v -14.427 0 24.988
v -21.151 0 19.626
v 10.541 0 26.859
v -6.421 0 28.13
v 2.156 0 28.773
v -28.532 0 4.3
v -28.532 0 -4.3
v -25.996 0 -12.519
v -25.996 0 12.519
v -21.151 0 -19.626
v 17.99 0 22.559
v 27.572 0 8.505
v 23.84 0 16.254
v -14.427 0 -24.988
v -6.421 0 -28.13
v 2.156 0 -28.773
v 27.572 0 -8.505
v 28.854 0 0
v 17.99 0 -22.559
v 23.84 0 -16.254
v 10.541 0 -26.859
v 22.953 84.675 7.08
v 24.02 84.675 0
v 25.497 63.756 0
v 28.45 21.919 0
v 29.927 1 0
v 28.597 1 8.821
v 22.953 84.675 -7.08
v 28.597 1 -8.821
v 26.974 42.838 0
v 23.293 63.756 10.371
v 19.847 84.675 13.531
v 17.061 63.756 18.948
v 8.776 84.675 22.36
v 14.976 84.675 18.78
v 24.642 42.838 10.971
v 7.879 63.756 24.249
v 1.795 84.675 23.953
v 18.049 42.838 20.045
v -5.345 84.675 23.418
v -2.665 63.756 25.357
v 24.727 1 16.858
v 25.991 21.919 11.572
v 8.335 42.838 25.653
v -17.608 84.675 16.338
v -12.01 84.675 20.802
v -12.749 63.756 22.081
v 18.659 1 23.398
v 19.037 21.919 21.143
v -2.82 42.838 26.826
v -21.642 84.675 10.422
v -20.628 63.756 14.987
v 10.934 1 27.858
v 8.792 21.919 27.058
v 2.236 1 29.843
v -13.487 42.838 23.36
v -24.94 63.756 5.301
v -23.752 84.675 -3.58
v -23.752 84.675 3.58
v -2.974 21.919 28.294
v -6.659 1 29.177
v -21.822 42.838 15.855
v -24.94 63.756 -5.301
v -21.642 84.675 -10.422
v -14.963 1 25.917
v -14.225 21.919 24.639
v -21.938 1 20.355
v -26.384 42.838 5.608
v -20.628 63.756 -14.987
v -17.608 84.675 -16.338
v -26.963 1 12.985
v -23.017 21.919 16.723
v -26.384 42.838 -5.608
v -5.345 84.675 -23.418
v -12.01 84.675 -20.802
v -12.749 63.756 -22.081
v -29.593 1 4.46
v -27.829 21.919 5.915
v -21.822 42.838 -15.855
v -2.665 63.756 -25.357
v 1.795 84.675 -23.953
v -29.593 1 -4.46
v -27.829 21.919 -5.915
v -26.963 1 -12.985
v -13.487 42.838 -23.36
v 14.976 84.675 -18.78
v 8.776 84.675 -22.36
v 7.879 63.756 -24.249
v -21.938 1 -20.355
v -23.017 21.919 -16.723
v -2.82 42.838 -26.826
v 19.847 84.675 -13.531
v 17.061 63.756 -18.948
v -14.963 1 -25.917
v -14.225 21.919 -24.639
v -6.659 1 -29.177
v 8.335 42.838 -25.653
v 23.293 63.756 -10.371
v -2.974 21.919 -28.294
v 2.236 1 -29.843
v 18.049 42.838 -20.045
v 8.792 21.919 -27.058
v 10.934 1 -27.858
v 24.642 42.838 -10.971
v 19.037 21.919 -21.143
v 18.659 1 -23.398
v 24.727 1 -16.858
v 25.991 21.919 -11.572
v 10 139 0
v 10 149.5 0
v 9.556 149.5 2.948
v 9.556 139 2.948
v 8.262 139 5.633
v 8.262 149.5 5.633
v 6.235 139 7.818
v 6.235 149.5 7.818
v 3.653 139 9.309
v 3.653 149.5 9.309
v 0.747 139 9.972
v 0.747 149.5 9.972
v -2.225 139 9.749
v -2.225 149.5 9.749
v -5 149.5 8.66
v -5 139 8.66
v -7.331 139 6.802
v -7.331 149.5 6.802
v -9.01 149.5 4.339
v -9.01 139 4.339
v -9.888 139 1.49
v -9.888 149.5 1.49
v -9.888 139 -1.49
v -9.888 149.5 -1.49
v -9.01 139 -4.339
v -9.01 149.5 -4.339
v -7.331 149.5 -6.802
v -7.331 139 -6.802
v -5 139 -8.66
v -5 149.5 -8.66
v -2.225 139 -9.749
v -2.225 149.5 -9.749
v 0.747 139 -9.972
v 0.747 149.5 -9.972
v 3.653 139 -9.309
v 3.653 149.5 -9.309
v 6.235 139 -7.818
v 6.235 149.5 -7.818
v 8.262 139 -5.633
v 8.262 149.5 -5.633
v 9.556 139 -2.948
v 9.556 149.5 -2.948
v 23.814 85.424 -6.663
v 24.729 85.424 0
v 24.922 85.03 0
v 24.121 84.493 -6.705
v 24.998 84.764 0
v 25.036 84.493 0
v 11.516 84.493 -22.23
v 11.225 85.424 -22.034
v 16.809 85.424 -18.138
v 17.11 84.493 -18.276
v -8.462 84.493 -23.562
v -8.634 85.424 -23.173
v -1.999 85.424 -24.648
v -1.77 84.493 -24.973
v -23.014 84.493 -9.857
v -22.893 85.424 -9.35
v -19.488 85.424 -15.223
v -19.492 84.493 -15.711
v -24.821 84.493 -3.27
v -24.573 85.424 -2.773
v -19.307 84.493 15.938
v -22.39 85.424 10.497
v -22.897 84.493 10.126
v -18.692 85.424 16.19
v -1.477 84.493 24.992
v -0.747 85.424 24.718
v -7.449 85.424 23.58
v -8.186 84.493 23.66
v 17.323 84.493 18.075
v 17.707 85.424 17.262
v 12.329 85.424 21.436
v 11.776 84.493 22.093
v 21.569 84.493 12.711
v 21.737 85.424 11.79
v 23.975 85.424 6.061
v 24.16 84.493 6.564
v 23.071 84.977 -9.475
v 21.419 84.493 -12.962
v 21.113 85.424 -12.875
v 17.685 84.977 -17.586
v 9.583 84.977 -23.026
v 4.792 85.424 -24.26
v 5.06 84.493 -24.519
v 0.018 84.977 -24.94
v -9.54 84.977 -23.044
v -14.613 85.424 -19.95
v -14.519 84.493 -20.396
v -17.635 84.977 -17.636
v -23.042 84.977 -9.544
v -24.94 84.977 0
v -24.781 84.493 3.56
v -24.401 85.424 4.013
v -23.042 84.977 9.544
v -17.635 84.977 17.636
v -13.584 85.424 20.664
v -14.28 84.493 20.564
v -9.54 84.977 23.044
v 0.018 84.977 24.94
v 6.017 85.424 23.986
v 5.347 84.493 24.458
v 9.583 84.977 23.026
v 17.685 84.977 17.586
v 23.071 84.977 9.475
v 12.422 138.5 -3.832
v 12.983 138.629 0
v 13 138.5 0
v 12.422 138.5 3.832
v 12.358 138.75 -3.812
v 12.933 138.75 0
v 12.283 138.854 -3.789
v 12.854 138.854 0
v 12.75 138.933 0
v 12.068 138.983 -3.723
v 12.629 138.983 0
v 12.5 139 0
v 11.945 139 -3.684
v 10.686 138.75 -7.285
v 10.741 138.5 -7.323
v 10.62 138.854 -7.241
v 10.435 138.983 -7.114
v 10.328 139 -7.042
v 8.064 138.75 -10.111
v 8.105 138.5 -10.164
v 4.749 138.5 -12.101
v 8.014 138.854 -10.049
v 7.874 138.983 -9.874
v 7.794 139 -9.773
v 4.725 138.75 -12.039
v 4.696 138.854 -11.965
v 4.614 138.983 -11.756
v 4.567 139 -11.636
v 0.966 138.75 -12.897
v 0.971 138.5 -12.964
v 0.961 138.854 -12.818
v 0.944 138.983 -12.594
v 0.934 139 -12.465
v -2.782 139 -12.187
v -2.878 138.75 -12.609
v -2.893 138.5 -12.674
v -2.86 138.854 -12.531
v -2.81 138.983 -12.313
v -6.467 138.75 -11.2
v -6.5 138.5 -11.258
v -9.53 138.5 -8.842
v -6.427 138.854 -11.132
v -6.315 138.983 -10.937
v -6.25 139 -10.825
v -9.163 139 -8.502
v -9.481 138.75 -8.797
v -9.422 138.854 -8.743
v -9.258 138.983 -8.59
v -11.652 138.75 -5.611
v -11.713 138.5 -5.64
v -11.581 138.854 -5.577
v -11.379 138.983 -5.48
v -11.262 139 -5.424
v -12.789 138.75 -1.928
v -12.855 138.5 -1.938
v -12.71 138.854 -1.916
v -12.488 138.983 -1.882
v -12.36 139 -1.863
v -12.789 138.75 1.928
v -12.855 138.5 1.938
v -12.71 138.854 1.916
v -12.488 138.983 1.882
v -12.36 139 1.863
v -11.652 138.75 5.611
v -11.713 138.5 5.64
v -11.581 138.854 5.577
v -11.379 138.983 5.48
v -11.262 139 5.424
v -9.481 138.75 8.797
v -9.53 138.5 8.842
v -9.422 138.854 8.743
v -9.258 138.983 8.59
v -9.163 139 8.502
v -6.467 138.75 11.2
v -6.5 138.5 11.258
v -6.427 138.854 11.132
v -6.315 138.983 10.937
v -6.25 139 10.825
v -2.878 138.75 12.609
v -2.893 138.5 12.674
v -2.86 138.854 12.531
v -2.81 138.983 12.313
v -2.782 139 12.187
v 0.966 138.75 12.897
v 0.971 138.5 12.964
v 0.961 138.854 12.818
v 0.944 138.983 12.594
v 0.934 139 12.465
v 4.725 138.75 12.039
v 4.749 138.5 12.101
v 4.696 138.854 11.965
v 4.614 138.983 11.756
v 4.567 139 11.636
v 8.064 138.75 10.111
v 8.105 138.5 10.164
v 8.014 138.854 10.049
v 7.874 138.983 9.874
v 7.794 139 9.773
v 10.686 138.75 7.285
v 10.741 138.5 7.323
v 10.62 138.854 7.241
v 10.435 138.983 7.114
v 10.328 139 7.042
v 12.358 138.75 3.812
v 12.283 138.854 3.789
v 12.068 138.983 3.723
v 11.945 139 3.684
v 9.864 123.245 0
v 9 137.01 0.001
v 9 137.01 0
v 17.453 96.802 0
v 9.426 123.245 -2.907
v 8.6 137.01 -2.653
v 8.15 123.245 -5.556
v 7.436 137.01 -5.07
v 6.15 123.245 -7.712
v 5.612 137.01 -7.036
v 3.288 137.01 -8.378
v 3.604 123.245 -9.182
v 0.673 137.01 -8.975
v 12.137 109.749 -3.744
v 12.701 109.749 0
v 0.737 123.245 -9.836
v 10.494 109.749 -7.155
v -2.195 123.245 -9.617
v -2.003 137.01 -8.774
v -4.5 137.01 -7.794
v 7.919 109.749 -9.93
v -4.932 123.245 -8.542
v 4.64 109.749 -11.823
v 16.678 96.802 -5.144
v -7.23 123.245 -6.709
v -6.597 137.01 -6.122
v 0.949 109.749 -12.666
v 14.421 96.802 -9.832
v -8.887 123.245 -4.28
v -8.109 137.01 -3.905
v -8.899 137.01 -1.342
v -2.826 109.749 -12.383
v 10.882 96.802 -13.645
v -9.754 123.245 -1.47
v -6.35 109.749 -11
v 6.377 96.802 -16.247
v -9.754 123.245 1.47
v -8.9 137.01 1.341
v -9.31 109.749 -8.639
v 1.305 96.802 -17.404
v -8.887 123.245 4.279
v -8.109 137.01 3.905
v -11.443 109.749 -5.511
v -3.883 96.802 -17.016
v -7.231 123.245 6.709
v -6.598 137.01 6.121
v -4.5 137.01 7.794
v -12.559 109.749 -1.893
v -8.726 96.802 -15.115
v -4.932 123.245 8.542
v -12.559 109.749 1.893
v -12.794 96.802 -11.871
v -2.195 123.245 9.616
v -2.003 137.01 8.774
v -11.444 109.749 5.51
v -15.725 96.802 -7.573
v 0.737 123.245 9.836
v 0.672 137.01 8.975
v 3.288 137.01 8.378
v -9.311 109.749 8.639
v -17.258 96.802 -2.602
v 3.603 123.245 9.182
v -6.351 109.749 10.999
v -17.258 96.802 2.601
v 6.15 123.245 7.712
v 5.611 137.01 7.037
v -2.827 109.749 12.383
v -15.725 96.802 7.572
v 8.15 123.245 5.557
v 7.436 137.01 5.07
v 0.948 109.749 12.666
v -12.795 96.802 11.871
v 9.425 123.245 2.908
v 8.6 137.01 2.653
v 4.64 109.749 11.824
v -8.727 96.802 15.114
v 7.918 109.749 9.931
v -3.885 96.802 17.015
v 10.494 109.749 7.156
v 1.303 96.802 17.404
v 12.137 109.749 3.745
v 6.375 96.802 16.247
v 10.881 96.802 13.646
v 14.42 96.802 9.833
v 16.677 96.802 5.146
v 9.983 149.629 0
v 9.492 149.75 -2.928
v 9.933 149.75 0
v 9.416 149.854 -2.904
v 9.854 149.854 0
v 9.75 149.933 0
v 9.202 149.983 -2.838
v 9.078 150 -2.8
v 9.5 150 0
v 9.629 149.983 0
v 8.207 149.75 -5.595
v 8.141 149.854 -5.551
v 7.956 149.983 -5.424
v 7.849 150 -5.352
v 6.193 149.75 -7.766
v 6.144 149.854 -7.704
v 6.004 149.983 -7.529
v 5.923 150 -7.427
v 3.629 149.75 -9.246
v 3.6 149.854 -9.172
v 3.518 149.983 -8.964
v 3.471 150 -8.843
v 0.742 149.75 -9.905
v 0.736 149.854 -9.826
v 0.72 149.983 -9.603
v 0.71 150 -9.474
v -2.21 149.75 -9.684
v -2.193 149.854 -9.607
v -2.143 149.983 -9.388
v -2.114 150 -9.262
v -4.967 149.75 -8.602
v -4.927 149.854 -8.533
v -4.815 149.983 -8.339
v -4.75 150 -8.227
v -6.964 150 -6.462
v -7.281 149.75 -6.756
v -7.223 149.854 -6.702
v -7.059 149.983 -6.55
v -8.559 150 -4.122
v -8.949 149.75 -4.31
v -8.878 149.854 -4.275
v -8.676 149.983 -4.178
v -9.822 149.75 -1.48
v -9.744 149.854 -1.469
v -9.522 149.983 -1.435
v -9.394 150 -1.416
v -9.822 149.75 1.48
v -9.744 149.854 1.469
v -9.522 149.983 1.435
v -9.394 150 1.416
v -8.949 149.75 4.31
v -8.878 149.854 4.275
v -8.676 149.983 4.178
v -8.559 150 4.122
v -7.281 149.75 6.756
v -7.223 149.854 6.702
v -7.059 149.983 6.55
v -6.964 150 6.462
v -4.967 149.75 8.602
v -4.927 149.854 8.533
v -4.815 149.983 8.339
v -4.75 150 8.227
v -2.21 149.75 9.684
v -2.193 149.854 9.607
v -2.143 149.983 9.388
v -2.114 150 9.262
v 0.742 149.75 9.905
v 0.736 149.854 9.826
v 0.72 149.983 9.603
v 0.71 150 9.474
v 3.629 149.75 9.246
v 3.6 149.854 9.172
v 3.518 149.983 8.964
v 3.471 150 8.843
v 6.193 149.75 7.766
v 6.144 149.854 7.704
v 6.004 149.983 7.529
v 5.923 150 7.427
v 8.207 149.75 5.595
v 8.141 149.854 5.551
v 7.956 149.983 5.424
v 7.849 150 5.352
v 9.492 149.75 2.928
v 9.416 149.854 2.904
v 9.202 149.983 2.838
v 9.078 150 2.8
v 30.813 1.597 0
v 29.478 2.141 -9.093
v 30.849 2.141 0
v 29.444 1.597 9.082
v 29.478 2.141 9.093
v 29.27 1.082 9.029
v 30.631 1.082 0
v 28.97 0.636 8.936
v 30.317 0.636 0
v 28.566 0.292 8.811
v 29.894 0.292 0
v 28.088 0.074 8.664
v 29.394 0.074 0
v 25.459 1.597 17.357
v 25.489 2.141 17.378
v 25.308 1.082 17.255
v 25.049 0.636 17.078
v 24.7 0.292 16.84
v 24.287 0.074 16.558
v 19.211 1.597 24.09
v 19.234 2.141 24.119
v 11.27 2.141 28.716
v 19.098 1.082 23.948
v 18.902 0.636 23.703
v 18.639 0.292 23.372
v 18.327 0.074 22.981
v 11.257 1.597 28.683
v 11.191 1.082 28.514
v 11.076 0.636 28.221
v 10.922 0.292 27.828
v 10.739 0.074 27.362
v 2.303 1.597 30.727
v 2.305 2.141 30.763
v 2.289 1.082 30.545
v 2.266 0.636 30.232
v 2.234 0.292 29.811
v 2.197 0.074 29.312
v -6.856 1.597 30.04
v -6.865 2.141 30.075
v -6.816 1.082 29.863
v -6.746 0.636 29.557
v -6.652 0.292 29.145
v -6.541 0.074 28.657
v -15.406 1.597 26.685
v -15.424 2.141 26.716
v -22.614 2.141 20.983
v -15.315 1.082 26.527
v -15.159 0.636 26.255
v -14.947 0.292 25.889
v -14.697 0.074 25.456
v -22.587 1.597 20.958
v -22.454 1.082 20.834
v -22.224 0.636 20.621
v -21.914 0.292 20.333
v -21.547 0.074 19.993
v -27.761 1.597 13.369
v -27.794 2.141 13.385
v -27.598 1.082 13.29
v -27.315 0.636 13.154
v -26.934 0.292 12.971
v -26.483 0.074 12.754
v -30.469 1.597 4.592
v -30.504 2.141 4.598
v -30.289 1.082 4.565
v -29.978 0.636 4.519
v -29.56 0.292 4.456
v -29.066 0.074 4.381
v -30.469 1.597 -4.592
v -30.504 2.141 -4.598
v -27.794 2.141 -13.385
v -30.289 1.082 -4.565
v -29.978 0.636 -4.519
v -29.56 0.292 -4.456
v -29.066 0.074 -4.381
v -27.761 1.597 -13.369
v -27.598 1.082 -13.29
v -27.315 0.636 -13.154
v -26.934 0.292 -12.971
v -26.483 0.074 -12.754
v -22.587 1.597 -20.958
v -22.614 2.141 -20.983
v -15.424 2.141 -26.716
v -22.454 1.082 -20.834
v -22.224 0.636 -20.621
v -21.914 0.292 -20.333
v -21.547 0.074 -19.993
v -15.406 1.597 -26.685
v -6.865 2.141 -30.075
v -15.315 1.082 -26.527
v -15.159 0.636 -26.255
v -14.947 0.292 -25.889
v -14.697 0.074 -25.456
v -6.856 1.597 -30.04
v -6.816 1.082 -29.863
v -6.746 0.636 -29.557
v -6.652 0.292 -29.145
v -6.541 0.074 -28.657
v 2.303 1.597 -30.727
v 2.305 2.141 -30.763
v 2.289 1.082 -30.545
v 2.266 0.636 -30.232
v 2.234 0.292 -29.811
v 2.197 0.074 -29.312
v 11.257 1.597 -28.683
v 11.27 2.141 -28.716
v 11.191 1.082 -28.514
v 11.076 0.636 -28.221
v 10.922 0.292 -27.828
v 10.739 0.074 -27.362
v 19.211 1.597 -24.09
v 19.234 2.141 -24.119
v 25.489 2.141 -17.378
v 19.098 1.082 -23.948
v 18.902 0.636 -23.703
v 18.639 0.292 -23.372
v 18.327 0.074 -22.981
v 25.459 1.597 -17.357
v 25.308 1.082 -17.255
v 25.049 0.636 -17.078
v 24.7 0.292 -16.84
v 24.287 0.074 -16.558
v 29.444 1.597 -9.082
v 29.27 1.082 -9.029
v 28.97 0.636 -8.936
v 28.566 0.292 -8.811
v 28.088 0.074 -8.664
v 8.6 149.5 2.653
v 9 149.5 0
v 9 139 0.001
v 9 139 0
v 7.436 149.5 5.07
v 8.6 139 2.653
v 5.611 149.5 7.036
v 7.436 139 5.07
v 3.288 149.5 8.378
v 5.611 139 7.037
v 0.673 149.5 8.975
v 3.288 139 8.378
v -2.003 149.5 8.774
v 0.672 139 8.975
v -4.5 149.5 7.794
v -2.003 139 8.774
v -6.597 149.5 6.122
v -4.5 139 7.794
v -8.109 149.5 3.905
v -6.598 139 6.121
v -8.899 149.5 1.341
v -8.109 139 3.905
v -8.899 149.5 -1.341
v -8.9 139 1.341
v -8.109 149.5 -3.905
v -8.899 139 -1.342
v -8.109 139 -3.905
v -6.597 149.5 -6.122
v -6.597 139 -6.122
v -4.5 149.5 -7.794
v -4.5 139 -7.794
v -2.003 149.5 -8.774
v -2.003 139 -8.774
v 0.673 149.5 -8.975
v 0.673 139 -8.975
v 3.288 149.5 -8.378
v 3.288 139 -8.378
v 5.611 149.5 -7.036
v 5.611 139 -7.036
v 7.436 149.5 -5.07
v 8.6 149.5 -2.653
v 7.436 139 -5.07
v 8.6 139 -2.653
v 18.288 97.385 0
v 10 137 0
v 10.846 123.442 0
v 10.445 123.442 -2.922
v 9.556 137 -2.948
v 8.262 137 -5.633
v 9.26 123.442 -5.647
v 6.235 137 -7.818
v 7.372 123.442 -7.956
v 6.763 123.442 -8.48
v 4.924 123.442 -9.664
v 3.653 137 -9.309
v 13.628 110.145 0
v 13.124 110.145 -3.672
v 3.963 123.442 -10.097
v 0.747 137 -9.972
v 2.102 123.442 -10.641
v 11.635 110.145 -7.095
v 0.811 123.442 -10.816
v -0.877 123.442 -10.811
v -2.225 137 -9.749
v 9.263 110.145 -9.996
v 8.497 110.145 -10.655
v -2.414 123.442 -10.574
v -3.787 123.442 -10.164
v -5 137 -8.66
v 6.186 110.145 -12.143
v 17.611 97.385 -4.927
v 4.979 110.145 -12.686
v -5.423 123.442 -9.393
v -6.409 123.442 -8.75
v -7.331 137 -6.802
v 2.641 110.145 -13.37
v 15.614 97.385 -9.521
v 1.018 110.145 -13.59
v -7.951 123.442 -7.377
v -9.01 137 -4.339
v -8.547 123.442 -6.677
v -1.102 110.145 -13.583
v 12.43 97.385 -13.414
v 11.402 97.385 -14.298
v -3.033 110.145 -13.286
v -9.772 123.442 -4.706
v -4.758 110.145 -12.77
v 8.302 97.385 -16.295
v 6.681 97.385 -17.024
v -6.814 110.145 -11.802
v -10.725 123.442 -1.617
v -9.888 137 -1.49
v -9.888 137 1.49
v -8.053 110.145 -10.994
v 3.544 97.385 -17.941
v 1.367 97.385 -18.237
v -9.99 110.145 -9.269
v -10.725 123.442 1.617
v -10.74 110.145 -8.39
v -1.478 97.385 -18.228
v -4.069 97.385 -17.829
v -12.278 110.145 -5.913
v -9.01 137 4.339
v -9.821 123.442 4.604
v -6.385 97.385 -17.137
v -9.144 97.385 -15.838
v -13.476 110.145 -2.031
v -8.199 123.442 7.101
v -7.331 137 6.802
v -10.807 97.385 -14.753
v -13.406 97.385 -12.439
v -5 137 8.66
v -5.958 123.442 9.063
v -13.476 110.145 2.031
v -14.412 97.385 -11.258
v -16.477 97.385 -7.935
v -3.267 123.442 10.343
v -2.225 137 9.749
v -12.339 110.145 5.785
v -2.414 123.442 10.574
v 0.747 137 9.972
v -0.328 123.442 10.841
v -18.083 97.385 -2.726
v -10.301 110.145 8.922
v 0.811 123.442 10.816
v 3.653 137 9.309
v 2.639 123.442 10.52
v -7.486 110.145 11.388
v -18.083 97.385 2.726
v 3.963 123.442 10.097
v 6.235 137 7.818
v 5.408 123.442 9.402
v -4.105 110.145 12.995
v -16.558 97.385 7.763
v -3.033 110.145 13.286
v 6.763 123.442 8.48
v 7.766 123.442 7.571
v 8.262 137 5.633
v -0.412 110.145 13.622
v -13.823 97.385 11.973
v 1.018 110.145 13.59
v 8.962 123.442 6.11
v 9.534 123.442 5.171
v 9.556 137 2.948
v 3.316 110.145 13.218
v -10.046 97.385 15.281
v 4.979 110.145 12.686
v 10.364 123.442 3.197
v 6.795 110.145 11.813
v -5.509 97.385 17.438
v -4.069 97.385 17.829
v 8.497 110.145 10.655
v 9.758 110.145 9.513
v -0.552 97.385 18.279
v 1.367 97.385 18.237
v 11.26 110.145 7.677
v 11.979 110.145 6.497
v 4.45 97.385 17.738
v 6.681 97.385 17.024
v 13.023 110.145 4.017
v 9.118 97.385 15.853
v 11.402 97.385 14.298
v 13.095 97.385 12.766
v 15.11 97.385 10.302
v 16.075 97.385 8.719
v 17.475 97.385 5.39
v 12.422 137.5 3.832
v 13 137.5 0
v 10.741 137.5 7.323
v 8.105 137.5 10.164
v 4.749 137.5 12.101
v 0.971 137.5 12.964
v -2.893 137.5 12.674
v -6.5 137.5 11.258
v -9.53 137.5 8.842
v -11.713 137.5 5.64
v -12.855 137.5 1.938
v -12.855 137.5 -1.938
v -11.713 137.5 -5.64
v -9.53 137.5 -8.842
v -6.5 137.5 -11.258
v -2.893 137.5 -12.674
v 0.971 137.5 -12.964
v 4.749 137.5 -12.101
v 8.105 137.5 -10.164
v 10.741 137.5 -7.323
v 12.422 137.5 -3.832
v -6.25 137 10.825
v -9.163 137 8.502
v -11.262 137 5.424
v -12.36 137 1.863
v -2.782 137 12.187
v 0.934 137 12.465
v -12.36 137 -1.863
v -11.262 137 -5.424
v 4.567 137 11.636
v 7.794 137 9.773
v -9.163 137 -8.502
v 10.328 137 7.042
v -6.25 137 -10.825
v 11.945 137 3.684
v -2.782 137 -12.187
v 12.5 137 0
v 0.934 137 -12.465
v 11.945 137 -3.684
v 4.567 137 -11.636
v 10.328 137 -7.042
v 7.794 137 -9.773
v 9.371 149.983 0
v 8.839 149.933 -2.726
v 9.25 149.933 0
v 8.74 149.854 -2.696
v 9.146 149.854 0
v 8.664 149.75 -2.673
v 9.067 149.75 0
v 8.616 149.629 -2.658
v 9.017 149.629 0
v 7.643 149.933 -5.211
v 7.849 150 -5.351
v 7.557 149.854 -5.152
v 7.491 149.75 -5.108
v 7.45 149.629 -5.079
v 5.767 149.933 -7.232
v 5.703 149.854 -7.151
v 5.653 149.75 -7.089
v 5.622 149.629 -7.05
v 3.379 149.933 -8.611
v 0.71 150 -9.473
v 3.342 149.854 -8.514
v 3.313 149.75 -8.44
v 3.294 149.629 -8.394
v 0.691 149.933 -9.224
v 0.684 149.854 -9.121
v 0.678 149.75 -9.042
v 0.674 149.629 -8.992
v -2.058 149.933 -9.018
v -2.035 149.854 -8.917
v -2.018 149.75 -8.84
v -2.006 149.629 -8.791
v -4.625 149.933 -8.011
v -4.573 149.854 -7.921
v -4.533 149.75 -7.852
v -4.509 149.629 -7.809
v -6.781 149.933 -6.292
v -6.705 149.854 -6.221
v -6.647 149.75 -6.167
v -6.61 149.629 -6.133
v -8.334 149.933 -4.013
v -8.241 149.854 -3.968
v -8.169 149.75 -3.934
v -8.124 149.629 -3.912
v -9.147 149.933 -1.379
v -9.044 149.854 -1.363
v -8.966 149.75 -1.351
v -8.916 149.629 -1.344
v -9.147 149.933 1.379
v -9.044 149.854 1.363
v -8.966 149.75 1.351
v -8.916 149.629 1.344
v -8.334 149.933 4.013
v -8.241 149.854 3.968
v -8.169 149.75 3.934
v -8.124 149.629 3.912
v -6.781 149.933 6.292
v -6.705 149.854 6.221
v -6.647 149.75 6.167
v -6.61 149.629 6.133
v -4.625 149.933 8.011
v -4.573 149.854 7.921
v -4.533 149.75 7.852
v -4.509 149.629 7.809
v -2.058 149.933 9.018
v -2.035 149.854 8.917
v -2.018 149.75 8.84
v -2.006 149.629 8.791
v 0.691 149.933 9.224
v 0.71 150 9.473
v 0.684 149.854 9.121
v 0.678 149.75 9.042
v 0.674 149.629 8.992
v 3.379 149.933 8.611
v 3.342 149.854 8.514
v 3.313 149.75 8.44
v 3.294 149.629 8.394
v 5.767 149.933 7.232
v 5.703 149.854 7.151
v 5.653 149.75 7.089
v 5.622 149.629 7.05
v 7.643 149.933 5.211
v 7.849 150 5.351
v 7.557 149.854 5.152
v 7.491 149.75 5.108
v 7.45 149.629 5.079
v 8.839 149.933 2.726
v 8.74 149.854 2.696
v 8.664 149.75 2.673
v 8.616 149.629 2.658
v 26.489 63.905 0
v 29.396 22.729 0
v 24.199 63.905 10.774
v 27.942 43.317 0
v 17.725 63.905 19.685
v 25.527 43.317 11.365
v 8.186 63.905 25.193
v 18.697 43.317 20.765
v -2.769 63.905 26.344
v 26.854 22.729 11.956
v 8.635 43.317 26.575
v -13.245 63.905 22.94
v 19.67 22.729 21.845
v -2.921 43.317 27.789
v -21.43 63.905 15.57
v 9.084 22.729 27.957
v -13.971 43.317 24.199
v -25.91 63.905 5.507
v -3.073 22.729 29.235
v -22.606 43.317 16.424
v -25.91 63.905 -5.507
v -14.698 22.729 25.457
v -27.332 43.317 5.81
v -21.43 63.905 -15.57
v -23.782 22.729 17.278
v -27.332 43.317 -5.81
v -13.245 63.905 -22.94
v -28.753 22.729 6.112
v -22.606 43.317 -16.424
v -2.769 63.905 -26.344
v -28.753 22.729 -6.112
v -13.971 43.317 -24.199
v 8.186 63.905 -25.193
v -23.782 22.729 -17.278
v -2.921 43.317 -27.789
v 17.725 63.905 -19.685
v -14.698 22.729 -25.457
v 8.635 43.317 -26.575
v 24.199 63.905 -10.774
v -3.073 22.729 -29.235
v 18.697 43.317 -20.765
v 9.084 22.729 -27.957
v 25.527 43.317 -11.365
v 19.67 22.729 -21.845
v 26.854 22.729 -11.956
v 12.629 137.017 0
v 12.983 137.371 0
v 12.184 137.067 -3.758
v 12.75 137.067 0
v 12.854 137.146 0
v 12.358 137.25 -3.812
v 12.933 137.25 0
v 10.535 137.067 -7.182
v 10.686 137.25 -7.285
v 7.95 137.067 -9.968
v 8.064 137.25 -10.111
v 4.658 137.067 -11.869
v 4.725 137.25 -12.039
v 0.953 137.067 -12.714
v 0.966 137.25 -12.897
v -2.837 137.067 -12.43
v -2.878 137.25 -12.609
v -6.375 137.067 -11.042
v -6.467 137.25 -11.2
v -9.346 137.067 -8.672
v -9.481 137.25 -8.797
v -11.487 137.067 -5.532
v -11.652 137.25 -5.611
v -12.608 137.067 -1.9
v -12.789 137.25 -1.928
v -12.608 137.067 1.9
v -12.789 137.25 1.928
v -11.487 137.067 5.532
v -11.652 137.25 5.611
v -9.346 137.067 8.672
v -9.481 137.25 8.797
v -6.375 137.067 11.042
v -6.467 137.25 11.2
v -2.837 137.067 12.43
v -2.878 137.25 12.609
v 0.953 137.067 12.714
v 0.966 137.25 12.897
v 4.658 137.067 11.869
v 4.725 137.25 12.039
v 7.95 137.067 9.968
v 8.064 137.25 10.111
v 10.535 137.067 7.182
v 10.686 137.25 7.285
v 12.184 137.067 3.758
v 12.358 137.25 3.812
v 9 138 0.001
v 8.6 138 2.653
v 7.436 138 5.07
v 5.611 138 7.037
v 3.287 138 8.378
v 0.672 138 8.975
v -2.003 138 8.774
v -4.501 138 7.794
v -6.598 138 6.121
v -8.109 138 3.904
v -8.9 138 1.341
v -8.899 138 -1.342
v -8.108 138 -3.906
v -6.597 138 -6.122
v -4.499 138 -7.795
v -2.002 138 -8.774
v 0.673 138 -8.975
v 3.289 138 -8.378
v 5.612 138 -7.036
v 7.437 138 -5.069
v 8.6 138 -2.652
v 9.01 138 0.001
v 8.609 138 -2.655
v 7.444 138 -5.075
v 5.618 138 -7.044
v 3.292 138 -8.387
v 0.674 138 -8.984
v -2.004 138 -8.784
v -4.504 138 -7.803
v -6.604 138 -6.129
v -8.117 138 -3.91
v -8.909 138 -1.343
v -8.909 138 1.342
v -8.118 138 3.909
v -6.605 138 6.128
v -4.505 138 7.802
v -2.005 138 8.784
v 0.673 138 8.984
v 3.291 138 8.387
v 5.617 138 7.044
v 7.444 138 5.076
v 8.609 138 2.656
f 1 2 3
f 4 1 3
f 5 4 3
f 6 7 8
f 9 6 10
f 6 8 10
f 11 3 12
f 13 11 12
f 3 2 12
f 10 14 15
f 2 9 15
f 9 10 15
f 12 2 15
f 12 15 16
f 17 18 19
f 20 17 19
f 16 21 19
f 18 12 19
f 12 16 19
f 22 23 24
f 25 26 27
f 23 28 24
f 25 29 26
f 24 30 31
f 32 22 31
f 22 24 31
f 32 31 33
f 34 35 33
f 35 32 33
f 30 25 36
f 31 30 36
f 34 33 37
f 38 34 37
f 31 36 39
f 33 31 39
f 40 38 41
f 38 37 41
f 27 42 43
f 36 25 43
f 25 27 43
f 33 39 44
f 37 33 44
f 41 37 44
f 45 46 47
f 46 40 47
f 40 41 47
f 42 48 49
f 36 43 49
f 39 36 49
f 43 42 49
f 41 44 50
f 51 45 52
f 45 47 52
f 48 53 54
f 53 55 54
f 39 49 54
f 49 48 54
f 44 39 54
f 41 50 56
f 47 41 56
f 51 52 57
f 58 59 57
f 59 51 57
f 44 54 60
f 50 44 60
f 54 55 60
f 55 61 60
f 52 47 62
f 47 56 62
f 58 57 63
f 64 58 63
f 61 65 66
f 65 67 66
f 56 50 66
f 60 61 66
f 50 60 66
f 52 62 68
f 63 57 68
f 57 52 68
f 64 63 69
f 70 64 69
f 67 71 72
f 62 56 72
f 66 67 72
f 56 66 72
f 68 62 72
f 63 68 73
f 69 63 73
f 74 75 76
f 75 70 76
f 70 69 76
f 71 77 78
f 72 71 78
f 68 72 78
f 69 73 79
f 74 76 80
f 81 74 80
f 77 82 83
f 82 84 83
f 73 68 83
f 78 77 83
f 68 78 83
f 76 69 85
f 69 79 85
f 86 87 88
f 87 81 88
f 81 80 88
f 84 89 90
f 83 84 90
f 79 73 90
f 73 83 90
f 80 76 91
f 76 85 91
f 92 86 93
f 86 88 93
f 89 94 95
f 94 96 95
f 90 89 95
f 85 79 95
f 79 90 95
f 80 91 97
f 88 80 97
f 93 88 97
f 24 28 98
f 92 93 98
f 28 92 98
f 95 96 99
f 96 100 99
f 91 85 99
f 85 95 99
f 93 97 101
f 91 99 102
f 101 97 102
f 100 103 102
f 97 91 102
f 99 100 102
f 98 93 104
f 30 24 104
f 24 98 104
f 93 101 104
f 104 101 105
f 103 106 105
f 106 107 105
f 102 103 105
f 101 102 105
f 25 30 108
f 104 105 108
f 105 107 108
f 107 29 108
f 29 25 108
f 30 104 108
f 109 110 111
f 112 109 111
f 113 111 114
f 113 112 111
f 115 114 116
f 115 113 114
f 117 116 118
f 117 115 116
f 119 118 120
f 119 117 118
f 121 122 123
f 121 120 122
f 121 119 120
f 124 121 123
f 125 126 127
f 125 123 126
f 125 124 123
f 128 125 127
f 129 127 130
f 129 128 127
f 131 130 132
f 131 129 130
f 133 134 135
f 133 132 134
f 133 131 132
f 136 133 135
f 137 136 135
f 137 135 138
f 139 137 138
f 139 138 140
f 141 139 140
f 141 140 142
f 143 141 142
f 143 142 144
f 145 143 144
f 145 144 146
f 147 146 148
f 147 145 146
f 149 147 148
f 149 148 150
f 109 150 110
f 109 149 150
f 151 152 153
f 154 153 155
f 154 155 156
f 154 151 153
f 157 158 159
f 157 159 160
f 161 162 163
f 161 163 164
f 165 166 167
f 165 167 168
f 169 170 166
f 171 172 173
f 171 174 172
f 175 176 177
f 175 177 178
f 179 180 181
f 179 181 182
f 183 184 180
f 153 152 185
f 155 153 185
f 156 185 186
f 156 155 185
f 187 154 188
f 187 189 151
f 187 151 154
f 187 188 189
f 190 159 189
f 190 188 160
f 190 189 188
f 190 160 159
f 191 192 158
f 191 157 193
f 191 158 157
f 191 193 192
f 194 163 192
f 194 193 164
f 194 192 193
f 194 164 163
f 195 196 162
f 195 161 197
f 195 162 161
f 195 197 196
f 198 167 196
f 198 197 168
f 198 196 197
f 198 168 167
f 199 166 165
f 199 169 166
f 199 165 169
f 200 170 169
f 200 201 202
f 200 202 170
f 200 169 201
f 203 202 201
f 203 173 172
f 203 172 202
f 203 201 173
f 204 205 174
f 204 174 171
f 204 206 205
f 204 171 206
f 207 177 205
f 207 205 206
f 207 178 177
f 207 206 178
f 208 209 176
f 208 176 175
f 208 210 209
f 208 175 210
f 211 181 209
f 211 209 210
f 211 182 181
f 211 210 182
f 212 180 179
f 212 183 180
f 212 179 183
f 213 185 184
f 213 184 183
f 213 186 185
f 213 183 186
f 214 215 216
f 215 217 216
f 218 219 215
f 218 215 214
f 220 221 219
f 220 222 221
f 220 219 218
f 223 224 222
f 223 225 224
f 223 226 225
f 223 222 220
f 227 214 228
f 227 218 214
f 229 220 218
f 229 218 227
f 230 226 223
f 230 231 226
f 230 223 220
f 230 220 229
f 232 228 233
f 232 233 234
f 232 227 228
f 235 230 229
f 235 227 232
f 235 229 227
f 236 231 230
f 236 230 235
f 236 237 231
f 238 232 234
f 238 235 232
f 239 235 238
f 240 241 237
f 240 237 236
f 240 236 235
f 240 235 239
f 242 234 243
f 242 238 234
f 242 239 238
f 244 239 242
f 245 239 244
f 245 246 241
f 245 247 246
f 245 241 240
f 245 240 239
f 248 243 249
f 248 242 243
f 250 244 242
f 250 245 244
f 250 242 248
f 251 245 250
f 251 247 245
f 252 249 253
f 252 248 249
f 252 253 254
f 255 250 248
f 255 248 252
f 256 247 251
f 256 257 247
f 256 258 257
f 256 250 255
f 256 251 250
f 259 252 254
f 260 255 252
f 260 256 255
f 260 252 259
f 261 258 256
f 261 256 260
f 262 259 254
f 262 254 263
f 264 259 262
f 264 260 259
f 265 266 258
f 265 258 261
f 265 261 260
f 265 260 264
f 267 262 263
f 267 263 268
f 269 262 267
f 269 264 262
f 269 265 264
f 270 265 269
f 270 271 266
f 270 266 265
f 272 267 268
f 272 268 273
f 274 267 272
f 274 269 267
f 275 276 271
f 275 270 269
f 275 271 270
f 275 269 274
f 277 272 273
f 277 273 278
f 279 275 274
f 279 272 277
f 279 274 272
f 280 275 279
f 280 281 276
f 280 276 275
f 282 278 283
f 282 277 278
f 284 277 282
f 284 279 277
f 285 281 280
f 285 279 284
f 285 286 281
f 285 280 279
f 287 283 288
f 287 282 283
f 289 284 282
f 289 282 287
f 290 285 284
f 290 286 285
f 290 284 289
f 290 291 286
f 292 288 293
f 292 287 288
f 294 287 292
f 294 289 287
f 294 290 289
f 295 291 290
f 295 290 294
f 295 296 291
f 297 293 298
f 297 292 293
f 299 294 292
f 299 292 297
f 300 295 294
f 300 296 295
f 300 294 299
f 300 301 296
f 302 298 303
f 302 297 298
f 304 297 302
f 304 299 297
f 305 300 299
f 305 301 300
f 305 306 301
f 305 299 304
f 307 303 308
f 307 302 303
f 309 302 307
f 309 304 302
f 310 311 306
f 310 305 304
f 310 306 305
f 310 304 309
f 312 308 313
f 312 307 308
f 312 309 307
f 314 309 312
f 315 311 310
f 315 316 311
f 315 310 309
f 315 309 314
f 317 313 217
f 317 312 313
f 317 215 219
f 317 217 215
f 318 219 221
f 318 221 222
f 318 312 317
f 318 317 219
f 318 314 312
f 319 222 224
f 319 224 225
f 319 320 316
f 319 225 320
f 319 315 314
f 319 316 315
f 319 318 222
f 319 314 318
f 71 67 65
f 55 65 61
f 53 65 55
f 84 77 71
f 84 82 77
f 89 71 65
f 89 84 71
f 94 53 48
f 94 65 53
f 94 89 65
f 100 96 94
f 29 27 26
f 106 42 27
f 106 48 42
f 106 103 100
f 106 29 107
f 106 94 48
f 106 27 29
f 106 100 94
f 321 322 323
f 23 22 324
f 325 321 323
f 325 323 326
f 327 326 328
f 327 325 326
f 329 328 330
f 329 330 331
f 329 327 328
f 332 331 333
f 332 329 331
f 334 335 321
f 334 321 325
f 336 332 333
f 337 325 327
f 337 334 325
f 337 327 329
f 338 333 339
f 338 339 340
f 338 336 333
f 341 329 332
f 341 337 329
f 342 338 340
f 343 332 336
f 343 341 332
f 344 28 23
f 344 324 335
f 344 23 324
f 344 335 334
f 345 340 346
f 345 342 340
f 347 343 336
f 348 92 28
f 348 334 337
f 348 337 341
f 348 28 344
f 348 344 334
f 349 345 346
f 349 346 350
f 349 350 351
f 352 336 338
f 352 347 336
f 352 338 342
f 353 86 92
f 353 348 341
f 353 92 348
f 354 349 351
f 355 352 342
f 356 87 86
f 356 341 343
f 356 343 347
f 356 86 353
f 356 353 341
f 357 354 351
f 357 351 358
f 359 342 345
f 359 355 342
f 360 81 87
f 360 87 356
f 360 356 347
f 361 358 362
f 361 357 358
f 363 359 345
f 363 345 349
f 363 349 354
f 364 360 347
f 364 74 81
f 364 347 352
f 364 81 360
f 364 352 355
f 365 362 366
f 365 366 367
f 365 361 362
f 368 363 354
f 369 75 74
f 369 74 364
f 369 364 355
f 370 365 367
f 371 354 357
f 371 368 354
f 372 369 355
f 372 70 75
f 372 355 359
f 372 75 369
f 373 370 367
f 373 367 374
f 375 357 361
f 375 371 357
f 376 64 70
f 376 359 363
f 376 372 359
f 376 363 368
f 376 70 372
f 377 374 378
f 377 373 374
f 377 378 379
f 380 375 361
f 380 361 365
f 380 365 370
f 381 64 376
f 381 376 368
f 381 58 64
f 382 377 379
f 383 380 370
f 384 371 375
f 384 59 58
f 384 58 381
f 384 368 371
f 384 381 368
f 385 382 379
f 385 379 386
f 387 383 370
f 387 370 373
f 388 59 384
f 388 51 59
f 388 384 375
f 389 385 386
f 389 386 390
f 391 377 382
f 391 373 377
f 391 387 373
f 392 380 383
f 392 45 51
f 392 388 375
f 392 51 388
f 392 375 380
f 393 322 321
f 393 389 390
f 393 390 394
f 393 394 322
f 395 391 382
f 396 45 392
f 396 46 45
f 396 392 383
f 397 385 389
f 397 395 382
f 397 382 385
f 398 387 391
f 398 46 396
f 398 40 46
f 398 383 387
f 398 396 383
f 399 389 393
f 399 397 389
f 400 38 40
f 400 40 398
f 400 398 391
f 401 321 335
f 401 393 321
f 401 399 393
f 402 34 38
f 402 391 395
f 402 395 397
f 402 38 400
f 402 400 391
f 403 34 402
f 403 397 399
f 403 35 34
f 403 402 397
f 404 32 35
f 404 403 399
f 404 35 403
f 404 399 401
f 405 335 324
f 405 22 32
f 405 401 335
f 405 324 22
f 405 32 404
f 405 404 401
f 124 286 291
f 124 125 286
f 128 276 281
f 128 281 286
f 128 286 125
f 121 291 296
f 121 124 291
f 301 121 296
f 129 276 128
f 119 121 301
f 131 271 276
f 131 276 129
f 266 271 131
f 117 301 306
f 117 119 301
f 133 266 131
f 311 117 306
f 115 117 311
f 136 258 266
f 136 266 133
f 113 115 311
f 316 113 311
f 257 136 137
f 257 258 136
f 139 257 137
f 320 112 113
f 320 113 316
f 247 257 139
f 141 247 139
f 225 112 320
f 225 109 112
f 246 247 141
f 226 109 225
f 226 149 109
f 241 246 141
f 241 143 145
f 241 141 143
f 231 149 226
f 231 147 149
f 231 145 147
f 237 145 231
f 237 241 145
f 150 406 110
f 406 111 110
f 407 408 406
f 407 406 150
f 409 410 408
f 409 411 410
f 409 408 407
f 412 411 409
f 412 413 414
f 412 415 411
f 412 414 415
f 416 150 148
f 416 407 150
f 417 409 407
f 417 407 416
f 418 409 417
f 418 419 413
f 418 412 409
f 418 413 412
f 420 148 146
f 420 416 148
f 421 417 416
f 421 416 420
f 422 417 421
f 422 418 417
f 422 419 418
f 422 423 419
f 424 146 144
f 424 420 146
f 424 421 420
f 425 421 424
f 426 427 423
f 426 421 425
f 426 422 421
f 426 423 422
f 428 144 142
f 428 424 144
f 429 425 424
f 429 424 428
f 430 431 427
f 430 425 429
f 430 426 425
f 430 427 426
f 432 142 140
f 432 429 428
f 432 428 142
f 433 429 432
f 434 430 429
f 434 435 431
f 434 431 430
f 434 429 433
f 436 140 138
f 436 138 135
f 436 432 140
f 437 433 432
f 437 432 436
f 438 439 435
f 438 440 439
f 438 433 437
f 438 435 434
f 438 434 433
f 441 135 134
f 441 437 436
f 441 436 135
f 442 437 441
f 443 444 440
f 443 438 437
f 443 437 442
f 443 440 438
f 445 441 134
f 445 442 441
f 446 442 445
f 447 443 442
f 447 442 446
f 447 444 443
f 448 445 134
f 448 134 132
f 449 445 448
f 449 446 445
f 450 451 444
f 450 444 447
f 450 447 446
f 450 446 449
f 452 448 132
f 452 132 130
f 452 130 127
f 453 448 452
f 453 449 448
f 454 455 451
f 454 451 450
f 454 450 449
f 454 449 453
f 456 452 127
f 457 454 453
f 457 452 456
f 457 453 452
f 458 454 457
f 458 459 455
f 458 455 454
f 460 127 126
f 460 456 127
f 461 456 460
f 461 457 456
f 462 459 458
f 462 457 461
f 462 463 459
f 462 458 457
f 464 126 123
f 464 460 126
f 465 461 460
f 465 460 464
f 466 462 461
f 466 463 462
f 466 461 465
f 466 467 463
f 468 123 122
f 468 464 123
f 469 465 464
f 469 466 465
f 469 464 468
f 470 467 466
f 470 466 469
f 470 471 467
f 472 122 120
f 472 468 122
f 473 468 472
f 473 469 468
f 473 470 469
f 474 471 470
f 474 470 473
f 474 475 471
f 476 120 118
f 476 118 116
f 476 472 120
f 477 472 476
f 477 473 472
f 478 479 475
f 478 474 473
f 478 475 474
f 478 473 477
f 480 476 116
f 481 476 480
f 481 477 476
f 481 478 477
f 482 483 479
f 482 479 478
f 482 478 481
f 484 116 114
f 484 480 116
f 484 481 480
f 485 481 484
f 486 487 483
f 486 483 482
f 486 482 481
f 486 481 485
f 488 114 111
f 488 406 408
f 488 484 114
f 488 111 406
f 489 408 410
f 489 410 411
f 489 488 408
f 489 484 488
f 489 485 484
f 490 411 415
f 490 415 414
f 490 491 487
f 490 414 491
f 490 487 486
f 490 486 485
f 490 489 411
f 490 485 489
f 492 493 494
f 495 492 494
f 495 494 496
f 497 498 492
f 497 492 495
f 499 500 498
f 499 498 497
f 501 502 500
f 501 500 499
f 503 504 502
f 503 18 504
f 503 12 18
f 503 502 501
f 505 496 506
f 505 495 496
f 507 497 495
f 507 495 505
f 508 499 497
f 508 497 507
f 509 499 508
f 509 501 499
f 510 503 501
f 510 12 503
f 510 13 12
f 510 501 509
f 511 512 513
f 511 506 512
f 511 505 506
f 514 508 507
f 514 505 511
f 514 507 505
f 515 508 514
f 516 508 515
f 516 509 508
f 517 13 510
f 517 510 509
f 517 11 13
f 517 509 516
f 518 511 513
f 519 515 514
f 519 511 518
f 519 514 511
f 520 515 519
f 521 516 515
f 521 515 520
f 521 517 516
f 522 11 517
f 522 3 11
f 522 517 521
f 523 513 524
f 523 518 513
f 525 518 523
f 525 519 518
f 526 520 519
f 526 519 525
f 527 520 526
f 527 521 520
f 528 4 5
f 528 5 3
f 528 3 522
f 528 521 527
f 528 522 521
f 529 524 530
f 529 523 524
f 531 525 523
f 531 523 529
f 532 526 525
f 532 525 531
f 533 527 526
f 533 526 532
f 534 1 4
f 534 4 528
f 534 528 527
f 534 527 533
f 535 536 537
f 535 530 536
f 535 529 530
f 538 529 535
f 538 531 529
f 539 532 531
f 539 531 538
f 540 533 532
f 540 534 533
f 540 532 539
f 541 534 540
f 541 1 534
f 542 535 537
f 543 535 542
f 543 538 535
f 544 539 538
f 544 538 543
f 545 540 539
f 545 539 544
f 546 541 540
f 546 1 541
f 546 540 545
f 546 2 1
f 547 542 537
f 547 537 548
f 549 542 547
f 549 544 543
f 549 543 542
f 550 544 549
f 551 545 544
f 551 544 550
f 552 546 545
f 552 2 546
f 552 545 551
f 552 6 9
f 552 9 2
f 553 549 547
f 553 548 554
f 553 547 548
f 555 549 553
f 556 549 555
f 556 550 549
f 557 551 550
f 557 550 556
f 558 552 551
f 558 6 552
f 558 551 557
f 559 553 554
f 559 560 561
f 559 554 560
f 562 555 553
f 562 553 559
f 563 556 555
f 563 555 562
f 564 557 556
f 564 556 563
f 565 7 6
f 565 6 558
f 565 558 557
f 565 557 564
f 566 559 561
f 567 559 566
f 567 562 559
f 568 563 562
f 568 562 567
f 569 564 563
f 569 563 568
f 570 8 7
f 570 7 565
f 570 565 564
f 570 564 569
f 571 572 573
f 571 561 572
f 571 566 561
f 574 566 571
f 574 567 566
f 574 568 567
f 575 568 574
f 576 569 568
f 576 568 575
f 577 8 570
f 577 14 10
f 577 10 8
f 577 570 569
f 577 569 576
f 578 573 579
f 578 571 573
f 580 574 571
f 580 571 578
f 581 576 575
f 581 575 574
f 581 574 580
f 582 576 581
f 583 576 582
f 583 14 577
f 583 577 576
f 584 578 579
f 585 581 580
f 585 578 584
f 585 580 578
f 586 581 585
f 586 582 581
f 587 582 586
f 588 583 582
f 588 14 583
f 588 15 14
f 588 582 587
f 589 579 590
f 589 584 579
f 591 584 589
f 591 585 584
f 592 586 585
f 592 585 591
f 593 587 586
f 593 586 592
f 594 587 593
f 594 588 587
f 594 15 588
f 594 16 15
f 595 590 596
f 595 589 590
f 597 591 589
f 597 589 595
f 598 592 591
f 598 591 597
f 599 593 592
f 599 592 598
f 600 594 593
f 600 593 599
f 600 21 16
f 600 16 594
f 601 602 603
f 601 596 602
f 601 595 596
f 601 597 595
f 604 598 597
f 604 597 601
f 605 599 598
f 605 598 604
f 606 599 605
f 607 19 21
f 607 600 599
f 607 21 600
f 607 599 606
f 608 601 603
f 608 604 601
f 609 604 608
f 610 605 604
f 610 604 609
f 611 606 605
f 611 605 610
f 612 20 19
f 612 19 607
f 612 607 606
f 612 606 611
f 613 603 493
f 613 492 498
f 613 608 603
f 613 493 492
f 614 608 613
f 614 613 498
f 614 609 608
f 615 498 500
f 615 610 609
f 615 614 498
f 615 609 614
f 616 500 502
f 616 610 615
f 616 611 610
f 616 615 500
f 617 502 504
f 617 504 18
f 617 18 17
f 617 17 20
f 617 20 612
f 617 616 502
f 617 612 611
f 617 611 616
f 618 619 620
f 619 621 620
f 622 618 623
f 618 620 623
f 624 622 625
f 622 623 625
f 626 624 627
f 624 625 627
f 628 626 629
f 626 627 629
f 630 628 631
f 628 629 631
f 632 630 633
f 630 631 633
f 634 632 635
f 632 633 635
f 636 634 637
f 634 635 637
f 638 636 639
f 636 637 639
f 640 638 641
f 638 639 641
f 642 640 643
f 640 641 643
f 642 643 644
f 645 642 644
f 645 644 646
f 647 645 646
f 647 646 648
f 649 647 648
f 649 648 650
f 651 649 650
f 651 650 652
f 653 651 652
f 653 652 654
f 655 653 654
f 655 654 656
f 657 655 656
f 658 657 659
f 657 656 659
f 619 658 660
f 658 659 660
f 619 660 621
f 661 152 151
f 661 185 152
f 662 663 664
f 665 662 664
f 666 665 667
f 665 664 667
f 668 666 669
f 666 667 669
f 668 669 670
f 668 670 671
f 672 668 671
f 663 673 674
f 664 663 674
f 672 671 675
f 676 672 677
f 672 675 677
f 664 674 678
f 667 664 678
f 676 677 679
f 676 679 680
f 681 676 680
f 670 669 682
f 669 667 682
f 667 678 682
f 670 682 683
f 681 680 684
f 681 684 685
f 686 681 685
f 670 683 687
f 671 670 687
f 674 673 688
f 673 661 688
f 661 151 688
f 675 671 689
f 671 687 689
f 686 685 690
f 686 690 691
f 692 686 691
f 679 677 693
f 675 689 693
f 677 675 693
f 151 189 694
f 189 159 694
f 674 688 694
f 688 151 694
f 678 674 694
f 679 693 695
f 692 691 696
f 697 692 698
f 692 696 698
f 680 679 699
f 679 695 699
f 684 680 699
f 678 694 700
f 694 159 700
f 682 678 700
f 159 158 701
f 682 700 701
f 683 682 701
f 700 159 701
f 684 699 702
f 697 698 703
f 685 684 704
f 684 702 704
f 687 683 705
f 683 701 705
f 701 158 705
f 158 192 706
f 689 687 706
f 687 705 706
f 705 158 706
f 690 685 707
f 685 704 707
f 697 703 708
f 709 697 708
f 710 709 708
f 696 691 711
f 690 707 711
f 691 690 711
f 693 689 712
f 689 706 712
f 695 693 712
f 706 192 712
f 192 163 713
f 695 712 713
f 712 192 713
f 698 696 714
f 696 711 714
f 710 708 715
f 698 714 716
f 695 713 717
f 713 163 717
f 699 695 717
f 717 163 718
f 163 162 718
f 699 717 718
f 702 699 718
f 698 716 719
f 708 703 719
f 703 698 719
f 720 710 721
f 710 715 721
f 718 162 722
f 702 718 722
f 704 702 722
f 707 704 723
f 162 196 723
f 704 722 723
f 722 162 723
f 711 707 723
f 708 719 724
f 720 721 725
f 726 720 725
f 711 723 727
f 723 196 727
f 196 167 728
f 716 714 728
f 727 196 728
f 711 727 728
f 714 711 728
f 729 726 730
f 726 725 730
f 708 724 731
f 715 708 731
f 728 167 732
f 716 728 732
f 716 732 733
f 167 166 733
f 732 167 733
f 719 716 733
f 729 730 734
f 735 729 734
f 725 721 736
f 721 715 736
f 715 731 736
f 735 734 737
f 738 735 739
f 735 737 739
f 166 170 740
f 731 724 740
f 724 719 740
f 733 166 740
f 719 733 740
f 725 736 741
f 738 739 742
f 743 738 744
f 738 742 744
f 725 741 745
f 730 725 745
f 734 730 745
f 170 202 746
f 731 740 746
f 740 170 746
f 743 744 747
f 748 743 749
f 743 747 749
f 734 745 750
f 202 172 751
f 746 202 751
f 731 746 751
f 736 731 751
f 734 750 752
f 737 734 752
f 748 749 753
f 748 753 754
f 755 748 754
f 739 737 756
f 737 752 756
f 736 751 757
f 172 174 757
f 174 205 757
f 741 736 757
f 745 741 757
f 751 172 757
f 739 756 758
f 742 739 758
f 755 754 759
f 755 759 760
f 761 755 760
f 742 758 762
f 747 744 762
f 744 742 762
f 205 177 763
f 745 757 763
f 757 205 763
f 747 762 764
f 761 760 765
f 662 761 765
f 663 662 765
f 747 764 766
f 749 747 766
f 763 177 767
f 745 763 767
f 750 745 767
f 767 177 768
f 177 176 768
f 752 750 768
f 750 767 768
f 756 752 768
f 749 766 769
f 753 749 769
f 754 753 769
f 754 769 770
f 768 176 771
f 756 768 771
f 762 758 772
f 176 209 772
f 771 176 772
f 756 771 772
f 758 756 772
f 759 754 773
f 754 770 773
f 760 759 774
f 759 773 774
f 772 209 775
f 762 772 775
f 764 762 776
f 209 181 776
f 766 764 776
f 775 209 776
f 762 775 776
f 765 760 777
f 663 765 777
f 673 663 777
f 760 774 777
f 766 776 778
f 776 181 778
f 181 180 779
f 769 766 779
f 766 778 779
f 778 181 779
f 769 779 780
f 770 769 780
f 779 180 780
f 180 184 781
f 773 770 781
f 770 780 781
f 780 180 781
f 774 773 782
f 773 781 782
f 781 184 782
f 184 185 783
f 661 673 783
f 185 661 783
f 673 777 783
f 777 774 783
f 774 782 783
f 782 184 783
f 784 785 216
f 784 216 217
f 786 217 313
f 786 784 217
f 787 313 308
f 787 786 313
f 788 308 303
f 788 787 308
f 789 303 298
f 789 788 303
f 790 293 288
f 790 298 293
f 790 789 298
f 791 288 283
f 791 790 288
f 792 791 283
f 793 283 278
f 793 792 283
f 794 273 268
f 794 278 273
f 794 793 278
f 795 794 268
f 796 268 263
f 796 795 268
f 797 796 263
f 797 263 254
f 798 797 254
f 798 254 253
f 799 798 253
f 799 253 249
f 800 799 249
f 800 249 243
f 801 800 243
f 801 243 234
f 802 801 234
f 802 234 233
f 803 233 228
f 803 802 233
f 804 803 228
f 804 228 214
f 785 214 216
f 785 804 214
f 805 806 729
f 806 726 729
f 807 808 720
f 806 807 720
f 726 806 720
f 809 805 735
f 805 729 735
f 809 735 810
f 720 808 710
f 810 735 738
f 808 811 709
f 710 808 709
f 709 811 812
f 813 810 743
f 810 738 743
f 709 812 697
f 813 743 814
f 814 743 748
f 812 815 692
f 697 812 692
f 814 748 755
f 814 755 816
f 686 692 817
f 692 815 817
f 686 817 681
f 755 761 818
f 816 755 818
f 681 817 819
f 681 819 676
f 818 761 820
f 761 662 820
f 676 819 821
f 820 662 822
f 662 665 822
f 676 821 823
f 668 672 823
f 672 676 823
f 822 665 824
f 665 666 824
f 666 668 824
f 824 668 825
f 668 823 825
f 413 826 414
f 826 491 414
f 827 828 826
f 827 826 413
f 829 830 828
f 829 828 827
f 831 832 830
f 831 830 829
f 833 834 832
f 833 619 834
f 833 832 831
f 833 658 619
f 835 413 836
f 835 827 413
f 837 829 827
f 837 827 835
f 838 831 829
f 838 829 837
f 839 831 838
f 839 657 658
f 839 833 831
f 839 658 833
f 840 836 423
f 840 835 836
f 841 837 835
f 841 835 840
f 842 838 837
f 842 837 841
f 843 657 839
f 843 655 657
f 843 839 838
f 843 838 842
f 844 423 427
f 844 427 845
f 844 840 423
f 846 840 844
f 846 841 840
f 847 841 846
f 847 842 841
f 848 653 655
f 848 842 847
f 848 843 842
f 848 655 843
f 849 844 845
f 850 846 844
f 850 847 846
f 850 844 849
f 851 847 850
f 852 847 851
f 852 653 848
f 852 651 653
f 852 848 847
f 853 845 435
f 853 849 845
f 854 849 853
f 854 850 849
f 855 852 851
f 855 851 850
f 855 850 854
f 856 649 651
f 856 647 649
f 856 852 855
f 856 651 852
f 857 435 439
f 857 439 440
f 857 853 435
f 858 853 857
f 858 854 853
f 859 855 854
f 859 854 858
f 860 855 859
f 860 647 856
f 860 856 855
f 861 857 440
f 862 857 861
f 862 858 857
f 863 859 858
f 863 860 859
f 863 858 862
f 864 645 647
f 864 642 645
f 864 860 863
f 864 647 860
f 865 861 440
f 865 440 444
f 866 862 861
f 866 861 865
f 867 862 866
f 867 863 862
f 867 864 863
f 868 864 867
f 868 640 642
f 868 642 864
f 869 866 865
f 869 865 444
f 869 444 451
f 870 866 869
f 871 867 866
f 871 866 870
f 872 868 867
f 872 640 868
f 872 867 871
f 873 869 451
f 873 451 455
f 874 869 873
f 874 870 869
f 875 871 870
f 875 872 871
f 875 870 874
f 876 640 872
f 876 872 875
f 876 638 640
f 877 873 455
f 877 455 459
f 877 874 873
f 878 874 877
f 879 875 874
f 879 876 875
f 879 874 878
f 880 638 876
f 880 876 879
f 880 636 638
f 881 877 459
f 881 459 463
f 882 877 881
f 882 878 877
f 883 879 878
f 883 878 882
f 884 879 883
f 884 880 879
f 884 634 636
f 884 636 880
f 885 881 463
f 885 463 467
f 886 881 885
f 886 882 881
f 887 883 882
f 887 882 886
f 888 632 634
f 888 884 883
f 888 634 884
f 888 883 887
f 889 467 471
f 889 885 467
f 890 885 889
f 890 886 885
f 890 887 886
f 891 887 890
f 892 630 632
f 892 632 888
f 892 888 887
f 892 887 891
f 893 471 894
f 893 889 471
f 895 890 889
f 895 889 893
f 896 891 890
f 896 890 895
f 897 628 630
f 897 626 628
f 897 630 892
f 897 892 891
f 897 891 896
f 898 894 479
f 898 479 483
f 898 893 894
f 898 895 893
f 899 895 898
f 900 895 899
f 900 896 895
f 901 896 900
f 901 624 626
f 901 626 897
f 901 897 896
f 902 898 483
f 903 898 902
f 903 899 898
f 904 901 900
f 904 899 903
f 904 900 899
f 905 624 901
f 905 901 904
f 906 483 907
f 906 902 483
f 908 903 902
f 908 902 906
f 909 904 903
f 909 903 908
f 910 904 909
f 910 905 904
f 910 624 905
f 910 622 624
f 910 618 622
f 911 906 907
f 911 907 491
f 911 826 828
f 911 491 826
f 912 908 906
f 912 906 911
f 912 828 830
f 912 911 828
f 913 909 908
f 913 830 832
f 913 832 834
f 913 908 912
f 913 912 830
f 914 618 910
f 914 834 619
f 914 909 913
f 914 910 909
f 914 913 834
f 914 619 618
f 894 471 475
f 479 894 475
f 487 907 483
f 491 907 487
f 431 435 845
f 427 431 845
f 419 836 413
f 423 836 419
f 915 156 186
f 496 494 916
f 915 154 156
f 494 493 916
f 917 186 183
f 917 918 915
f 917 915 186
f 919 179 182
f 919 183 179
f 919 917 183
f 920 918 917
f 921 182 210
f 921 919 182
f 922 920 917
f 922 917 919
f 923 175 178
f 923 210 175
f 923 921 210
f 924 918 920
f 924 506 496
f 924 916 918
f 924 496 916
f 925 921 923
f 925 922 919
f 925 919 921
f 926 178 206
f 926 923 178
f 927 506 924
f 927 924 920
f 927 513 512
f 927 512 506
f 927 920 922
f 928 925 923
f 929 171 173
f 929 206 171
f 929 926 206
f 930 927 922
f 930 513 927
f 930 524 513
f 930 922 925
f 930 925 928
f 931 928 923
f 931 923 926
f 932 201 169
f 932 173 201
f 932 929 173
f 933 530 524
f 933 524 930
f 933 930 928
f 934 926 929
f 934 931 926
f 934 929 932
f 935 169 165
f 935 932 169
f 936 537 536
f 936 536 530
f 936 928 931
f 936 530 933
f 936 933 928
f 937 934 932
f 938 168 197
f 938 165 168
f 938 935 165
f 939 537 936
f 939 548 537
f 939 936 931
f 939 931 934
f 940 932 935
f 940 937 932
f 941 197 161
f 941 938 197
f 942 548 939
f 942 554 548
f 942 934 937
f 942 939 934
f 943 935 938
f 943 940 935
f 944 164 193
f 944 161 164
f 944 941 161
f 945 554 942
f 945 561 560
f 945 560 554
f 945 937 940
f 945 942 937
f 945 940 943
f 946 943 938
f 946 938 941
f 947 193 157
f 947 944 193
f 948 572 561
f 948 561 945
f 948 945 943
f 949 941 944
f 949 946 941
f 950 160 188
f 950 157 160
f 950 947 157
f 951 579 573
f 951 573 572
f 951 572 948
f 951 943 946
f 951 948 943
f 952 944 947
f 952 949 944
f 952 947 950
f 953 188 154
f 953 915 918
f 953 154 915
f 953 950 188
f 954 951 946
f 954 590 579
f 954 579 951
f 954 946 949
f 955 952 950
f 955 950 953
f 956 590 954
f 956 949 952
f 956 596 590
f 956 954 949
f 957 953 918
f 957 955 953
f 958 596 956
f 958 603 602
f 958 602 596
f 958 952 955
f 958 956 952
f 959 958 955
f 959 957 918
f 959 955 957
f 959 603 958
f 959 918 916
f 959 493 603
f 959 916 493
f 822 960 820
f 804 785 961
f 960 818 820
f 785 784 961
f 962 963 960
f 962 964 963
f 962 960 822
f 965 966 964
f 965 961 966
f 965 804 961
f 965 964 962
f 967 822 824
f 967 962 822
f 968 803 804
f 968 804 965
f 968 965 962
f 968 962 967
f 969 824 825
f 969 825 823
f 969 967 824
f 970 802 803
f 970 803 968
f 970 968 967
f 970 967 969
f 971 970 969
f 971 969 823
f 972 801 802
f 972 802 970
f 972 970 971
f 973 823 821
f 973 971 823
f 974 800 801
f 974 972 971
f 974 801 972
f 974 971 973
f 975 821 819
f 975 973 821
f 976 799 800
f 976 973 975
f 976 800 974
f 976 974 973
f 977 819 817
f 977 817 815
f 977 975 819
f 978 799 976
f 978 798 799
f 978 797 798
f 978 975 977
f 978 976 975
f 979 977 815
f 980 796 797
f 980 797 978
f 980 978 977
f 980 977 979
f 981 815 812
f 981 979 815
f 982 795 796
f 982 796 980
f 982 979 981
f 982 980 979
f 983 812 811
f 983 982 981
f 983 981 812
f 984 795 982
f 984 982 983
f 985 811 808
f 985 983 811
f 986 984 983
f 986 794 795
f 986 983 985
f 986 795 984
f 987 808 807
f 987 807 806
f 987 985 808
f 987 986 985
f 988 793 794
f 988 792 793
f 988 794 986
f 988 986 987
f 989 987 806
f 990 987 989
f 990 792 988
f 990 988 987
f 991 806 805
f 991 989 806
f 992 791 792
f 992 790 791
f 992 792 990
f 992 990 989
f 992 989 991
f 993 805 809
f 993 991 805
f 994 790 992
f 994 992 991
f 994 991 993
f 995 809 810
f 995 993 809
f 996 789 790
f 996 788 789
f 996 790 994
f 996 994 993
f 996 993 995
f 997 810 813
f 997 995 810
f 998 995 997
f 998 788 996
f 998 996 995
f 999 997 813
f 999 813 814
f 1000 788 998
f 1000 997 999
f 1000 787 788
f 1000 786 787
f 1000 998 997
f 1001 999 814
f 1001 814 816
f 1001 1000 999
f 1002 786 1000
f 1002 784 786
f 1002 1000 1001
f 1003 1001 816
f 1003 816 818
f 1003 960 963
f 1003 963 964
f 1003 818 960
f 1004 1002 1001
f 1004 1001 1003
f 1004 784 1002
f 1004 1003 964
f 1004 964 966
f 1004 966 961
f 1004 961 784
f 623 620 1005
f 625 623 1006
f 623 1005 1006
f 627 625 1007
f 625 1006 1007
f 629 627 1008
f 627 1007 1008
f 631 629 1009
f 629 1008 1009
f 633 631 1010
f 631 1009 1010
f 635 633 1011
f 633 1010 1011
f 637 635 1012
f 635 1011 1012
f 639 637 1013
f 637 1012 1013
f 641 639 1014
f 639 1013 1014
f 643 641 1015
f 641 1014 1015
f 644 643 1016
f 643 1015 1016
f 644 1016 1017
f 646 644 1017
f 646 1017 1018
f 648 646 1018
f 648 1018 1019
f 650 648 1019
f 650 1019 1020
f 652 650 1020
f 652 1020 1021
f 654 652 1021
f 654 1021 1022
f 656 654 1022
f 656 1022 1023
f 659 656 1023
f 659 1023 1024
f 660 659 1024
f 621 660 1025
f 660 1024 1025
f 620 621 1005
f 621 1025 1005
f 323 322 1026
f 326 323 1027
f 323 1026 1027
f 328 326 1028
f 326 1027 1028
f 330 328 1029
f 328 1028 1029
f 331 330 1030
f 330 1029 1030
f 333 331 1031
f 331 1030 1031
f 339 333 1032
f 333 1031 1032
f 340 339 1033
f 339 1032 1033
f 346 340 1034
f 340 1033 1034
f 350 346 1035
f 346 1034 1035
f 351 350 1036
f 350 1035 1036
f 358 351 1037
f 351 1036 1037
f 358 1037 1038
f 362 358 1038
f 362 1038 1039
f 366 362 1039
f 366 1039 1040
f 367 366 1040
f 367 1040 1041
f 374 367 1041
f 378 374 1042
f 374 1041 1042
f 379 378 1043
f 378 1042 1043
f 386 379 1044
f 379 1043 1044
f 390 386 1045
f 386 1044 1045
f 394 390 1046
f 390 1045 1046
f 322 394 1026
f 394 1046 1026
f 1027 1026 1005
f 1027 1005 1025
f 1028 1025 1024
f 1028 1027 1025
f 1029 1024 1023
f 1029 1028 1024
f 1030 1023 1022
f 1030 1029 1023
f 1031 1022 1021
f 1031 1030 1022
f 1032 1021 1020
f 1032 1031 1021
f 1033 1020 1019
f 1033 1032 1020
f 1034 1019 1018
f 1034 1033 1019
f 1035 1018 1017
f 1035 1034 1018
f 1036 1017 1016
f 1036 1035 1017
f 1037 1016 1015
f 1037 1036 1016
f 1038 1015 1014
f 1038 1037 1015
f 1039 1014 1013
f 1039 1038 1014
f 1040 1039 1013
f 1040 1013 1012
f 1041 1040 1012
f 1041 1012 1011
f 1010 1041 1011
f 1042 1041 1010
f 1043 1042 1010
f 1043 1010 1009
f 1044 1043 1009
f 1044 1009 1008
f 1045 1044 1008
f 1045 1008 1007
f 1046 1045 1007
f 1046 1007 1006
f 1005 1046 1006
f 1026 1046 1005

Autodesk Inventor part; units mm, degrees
ref_plane "YZ Plane" through (0, 0, 0) normal (1, 0, 0) x (0, 1, 0)
ref_plane "XZ Plane" through (0, 0, 0) normal (0, 1, 0) x (-1, 0, 0)
ref_plane "XY Plane" through (0, 0, 0) normal (0, 0, 1) x (1, 0, 0)
sketch "Sketch1" plane through (0, 0, 0) normal (0, 0, 1) x (1, 0, 0)
  line L0 (0, 0) -> (0, 150)
  line L1 (0, 0) -> (31, 0)
  line L2 (0, 150) -> (10, 150)
  line L3 (10, 150) -> (10, 139)
  line L4 (10, 139) -> (13, 139)
  line L5 (13, 139) -> (13, 137)
  line L6 (13, 137) -> (10, 137)
  arc A0 (10, 137) -> (25, 85) centre (104.4877, 136.0926) ccw
  line L7 (25, 85) -> (31, 0)
revolve "Revolution1" add sketch "Sketch1" angle 360 about axis through (0, 0, 0) along (0, 1, 0)
shell "Shell1" thickness 1 removed faces 1 at (-1.6385, 150, 0.6428)
fillet "Fillet1" radius 2 1 edges at (-25, 85, 0)
fillet "Fillet2" radius 2 1 edges at (-31, 0, 0)
fillet "Fillet3" radius 0.5 4 edges at (-10, 150, 0) (-9, 150, 0) (-13, 139, 0) (-13, 137, 0)
thread "Thread1" size "M20x2.5" class "6g" standard "ANSI Metric M Profile" full length
sketch "Sketch2" plane through (0, 139, 0) normal (0, 1, 0) x (1, 0, 0)
  point P0 (0, 0)
sketch "Sketch3" plane through (0, 1, 0) normal (0, 1, 0) x (1, 0, 0)
  point P0 (0, 0)
properties part number "flaska"
